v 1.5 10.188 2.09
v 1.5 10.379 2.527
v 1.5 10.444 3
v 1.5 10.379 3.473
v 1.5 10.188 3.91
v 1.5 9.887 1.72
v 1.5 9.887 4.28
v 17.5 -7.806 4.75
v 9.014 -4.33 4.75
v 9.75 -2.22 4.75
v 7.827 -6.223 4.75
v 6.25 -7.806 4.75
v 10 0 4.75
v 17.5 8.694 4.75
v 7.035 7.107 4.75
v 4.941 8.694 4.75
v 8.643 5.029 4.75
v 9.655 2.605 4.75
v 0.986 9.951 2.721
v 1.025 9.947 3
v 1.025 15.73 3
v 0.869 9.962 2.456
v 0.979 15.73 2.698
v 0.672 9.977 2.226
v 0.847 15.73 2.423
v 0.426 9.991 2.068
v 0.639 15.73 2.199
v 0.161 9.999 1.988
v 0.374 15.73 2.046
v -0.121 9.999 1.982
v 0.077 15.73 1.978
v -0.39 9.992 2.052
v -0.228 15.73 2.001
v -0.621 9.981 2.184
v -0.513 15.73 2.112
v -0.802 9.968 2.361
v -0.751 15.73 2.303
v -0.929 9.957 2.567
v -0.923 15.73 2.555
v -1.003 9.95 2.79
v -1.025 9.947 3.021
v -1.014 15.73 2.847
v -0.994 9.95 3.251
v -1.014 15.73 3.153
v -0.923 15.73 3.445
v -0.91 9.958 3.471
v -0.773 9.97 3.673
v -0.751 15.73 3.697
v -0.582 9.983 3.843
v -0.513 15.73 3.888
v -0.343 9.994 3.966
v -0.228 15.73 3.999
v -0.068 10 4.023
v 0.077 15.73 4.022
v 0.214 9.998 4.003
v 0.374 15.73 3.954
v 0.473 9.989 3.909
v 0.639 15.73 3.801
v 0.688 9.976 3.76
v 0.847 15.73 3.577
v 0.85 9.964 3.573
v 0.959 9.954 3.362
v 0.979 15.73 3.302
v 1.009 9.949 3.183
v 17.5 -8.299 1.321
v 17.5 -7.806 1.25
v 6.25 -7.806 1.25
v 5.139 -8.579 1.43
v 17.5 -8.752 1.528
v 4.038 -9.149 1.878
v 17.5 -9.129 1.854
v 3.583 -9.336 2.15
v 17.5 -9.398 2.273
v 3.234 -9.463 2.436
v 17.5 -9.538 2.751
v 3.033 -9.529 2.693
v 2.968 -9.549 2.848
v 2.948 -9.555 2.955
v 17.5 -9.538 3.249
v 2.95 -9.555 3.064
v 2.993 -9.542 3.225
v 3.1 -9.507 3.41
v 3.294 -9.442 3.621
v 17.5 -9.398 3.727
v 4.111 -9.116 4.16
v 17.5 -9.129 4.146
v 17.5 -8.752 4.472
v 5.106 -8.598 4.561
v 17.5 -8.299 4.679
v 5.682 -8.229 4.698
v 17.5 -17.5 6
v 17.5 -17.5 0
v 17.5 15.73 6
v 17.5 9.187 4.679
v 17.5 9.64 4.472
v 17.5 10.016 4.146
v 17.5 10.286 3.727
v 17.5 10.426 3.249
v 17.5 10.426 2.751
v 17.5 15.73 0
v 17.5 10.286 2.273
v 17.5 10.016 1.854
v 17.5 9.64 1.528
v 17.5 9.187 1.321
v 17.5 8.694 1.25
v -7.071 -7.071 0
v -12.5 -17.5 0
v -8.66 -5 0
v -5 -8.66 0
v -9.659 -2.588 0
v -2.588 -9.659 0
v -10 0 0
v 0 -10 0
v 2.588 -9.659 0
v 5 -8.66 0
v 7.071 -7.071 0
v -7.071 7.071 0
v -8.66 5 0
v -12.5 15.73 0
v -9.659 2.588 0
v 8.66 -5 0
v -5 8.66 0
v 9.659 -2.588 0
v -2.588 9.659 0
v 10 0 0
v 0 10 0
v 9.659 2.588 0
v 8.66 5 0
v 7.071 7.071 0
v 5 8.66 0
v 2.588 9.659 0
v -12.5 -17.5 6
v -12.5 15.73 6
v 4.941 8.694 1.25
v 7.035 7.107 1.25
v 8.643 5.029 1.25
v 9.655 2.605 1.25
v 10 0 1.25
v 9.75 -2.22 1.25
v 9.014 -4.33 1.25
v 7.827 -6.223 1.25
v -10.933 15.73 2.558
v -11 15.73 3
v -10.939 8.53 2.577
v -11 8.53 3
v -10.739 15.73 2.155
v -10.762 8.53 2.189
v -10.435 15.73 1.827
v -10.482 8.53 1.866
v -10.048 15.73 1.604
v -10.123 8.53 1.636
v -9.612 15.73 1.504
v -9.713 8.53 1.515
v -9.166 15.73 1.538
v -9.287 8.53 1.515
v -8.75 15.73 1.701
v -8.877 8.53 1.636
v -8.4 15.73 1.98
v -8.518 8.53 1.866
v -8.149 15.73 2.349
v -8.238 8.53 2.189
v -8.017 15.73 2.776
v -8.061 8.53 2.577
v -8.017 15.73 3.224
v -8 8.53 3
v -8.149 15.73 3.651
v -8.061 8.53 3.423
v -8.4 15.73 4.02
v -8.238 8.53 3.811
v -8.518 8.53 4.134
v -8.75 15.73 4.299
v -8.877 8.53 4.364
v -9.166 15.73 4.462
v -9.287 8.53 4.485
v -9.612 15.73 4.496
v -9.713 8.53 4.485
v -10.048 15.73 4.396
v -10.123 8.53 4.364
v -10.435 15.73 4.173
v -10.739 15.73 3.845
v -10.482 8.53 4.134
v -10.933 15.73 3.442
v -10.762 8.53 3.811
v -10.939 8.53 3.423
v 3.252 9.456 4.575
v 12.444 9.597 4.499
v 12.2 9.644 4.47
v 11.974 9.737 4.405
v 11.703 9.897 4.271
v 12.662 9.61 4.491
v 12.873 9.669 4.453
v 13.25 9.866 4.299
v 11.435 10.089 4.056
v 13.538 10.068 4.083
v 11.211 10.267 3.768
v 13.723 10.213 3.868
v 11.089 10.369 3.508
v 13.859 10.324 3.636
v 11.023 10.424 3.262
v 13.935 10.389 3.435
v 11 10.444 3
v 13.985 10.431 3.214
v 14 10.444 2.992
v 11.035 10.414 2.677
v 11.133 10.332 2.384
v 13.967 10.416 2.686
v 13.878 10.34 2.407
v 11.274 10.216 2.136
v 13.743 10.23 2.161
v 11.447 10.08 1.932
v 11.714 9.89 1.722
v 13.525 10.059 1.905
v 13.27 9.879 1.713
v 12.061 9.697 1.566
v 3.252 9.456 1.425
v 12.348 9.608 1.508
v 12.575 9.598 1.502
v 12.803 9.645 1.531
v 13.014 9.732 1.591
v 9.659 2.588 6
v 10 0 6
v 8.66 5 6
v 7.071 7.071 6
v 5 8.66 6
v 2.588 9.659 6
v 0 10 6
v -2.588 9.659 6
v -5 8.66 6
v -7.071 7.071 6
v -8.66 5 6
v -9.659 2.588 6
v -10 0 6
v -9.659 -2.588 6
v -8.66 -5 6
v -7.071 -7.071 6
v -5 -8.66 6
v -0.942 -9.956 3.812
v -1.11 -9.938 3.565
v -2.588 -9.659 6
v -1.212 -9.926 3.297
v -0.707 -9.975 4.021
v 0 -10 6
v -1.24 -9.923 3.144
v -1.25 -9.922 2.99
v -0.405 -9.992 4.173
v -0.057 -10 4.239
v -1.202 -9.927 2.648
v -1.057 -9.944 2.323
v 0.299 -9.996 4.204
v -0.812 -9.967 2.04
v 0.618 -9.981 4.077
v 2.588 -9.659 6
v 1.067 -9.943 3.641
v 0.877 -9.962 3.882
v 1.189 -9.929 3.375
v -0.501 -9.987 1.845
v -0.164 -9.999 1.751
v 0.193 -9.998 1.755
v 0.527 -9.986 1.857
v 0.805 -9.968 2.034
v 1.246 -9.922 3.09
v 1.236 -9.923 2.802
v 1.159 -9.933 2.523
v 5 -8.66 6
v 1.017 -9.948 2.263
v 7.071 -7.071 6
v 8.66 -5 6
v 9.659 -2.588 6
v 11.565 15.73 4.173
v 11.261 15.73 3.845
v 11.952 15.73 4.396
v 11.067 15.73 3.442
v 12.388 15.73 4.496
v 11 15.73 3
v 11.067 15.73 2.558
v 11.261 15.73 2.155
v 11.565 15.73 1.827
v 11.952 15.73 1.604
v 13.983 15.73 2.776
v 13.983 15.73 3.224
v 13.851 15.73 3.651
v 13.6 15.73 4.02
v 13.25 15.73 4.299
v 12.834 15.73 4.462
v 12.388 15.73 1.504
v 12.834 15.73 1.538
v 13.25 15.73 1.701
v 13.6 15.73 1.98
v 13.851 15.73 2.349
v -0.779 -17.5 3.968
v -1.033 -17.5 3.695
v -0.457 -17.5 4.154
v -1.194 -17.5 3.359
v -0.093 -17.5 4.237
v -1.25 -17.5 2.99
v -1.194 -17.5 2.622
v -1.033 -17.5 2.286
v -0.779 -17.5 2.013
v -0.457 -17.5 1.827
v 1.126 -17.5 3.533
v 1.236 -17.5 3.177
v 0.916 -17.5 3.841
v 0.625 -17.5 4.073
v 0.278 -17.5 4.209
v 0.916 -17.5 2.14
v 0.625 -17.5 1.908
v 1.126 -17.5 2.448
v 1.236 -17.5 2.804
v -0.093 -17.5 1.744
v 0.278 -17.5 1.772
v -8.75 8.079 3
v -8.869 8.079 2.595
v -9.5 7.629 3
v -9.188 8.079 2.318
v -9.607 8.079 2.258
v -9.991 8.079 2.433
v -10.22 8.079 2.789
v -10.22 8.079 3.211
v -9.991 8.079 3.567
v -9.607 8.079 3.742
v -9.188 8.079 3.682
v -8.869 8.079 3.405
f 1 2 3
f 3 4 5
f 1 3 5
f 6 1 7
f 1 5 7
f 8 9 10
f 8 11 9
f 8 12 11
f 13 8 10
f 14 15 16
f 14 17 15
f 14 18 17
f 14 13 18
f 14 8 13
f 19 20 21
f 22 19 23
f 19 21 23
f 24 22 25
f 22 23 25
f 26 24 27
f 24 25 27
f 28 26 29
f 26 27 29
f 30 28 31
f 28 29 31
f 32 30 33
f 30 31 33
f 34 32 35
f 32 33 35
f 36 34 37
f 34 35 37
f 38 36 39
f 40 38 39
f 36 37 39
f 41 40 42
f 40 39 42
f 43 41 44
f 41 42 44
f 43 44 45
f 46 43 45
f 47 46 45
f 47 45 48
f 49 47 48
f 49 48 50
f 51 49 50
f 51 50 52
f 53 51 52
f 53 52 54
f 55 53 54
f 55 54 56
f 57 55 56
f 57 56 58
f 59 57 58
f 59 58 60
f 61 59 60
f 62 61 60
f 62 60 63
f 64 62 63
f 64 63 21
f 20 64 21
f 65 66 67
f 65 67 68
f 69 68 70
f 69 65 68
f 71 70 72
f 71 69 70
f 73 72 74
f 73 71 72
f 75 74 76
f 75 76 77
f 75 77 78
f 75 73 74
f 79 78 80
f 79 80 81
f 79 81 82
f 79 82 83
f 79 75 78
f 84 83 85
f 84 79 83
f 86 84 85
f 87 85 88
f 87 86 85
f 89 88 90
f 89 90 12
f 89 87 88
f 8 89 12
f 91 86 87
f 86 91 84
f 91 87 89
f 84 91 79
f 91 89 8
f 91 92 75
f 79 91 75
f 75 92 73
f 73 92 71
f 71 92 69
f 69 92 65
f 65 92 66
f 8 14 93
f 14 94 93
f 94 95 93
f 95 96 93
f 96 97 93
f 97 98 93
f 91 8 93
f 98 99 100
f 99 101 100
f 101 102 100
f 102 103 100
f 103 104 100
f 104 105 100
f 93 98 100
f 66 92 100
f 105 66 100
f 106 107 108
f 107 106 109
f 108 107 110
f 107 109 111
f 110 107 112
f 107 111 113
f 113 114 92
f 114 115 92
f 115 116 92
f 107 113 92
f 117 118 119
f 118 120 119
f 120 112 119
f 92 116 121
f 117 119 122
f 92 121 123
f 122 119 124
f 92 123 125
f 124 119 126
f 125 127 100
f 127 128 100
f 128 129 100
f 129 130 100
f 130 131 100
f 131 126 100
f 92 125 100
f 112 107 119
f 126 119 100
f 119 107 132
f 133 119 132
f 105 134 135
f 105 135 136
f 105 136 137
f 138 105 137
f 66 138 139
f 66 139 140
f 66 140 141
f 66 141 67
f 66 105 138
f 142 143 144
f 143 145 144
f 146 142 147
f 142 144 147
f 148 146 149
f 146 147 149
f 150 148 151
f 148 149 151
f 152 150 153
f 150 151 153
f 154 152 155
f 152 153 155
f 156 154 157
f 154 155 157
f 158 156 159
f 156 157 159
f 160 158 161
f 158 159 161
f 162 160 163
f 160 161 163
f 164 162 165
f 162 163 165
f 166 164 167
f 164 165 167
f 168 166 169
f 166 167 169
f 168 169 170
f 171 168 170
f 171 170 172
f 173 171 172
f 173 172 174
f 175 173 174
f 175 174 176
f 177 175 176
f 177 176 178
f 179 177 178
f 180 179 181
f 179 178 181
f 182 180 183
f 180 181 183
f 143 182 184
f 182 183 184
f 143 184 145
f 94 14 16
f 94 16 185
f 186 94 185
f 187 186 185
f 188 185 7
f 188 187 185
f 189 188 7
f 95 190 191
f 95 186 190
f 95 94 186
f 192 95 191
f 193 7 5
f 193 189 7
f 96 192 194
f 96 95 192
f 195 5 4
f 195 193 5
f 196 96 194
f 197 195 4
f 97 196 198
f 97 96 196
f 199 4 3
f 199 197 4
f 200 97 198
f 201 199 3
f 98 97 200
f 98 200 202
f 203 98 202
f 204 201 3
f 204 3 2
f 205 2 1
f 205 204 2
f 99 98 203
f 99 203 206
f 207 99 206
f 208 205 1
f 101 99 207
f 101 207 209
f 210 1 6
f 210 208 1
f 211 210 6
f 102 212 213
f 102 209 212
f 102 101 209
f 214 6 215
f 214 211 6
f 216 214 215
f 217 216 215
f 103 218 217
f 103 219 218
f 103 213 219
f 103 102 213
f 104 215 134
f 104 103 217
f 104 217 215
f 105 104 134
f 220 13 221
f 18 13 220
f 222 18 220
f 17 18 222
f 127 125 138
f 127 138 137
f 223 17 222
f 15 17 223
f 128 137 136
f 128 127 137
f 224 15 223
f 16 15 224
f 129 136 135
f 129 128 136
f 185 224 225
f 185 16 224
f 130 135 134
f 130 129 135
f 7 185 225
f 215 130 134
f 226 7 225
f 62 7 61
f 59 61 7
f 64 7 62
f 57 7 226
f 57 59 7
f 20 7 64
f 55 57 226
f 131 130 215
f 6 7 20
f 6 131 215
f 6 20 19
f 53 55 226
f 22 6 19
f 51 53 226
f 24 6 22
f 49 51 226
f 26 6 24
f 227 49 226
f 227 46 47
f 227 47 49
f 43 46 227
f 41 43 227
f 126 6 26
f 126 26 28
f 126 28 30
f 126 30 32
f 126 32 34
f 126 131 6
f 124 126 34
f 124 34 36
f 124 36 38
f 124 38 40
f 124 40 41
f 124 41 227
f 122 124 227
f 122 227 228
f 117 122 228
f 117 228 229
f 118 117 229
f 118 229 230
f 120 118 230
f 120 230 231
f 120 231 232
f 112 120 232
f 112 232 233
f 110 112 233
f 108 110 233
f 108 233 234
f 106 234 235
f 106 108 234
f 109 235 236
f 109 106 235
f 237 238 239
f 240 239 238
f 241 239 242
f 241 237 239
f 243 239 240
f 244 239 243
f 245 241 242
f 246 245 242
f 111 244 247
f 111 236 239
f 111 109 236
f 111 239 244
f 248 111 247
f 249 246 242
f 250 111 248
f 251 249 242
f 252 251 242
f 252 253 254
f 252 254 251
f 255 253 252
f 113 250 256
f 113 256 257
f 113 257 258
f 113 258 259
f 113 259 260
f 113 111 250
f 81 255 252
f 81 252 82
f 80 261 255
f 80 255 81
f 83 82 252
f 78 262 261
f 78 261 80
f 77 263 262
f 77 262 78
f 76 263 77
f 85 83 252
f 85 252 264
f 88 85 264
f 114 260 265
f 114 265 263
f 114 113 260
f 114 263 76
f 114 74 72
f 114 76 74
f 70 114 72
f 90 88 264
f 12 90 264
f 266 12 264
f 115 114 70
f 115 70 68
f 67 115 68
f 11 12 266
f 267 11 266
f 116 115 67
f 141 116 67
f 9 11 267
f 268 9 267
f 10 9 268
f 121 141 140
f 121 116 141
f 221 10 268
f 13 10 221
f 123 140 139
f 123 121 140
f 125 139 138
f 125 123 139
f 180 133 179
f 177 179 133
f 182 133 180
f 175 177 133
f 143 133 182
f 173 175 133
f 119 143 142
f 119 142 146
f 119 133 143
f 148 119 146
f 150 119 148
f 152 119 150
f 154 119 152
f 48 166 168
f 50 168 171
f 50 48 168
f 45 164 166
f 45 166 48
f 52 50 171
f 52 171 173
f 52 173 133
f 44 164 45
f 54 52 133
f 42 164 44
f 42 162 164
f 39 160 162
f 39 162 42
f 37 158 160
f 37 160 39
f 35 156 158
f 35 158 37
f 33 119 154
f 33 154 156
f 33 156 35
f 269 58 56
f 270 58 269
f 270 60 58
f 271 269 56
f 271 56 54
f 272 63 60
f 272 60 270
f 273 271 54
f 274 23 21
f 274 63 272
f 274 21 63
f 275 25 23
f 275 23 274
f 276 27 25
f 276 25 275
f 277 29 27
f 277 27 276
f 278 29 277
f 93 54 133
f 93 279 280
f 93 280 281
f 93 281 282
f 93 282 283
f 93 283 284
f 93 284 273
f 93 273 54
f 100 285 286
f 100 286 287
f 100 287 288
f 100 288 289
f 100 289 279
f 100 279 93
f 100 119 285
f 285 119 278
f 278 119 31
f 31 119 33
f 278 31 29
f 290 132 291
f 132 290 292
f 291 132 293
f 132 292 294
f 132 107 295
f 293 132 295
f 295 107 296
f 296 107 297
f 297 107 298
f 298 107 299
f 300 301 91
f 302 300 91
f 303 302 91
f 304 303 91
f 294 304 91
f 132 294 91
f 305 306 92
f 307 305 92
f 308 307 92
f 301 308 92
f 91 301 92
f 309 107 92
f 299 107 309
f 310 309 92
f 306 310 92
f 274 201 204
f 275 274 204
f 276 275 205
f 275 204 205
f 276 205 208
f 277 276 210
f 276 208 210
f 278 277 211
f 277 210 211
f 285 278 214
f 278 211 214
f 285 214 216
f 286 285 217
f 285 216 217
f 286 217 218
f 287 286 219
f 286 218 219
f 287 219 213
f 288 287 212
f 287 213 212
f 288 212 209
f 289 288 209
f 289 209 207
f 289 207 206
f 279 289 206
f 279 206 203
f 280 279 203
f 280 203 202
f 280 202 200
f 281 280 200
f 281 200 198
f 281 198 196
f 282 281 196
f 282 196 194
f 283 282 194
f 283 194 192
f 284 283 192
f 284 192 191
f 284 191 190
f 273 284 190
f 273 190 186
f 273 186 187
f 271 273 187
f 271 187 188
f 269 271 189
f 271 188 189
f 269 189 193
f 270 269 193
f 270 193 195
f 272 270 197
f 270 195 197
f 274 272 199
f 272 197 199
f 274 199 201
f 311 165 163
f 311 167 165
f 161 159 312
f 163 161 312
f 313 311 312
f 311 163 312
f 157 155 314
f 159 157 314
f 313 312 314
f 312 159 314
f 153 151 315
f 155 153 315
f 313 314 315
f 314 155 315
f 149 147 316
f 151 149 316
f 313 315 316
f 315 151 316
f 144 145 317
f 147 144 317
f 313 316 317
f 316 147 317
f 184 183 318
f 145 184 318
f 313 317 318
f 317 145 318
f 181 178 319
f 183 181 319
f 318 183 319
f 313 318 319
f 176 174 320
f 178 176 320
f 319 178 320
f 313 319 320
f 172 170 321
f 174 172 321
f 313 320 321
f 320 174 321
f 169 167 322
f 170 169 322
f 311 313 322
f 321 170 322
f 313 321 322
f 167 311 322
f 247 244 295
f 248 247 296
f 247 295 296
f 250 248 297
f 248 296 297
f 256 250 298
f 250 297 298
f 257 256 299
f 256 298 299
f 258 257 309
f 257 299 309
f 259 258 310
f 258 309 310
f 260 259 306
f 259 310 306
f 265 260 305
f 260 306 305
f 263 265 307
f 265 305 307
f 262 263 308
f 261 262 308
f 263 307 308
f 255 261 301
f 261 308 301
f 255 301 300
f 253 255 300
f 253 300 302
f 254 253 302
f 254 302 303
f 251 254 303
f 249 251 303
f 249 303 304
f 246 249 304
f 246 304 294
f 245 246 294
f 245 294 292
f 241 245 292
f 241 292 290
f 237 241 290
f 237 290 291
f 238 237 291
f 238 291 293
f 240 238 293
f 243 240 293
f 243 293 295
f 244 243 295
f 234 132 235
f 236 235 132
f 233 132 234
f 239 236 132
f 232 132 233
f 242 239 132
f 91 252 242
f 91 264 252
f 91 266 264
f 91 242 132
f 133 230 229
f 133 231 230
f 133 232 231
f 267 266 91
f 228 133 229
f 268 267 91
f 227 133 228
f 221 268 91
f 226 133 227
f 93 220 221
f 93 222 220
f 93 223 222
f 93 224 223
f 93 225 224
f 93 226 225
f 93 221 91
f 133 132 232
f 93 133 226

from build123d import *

# Parameters (mm, degrees)
SKETCH1_W                     = 35
SKETCH1_H                     = 33.23
SKETCH1_R                     = 10
BOSS_EXTRUDE1_DEPTH           = 6
CUT_EXTRUDE1_DEPTH            = 16
F_3_0MM_DOWEL_HOLE1_D         = 3
F_3_0MM_DOWEL_HOLE1_DEPTH     = 7.2
F_3_0MM_DOWEL_HOLE1_TIP       = 0.901290929
SKETCH9_W                     = 6
SKETCH9_H                     = 33.23
CUT_EXTRUDE2_DEPTH            = 5
M2_5X0_45_TAPPED_HOLE1_REACH  = 40.033
M2_5X0_45_TAPPED_HOLE1_BORE_R = 1.025
M3X0_5_TAPPED_HOLE2_REACH     = 40.033
M3X0_5_TAPPED_HOLE2_BORE_R    = 1.25


with BuildPart() as part:
    # Sketch1 → Boss-Extrude1 (new body)
    with BuildSketch(Plane.XY):
        with Locations((0, -0.885)):
            Rectangle(SKETCH1_W, SKETCH1_H)
        Circle(SKETCH1_R, mode=Mode.SUBTRACT)
    extrude(amount=BOSS_EXTRUDE1_DEPTH)

    # Sketch2 → Cut-Extrude1 (cut)
    with BuildSketch(Plane(origin=(17.5, 0, 0), x_dir=(0, 0, -1), z_dir=(1, 0, 0))):
        with BuildLine():
            Line((-4.75, -7.806071268), (-4.75, 8.693928732))
            ThreePointArc((-4.75, 8.693928732), (-3, 10.443928732), (-1.25, 8.693928732))
            Line((-1.25, 8.693928732), (-1.25, -7.806071268))
            ThreePointArc((-1.25, -7.806071268), (-3, -9.556071268), (-4.75, -7.806071268))
        make_face()
    extrude(amount=-CUT_EXTRUDE1_DEPTH, mode=Mode.SUBTRACT)

    # Ø3.0mm Dowel Hole1
    with Locations(Plane(origin=(0, 15.73, 0), x_dir=(1, 0, 0), z_dir=(0, 1, 0))):
        with Locations((-9.5, -3), (12.5, -3)):
            Hole(F_3_0MM_DOWEL_HOLE1_D / 2, depth=F_3_0MM_DOWEL_HOLE1_DEPTH)
            with Locations((0, 0, -(F_3_0MM_DOWEL_HOLE1_DEPTH + F_3_0MM_DOWEL_HOLE1_TIP / 2))):  # 118° drill point
                Cone(0, F_3_0MM_DOWEL_HOLE1_D / 2, F_3_0MM_DOWEL_HOLE1_TIP, mode=Mode.SUBTRACT)

    # Sketch9 → Cut-Extrude2 (cut)
    with BuildSketch(Plane.ZY.offset(17.5)):
        with Locations((3, -0.885)):
            Rectangle(SKETCH9_W, SKETCH9_H)
    extrude(amount=-CUT_EXTRUDE2_DEPTH, mode=Mode.SUBTRACT)

    # M2.5x0.45 Tapped Hole1 bore → M2.5x0.45 Tapped Hole1 (cut, up to next)
    with BuildSketch(Plane(origin=(0, 15.73, 0), x_dir=(1, 0, 0), z_dir=(0, 1, 0)), mode=Mode.PRIVATE) as m2_5x0_45_tapped_hole1_sk1:
        with Locations((0, -3)):
            Circle(M2_5X0_45_TAPPED_HOLE1_BORE_R)
    m2_5x0_45_tapped_hole1_tool1 = extrude(m2_5x0_45_tapped_hole1_sk1.sketch, amount=-M2_5X0_45_TAPPED_HOLE1_REACH, mode=Mode.PRIVATE) & part.part
    add(m2_5x0_45_tapped_hole1_tool1.solids().sort_by_distance((0, 15.73, 3))[0], mode=Mode.SUBTRACT)

    # M3x0.5 Tapped Hole2 bore → M3x0.5 Tapped Hole2 (cut, up to next)
    with BuildSketch(Plane(origin=(0, -17.5, 0), x_dir=(-1, 0, 0), z_dir=(0, -1, 0)), mode=Mode.PRIVATE) as m3x0_5_tapped_hole2_sk1:
        with Locations((0, -2.990437558)):
            Circle(M3X0_5_TAPPED_HOLE2_BORE_R)
    m3x0_5_tapped_hole2_tool1 = extrude(m3x0_5_tapped_hole2_sk1.sketch, amount=-M3X0_5_TAPPED_HOLE2_REACH, mode=Mode.PRIVATE) & part.part
    add(m3x0_5_tapped_hole2_tool1.solids().sort_by_distance((0, -17.5, 2.990438))[0], mode=Mode.SUBTRACT)


solid = part.part
